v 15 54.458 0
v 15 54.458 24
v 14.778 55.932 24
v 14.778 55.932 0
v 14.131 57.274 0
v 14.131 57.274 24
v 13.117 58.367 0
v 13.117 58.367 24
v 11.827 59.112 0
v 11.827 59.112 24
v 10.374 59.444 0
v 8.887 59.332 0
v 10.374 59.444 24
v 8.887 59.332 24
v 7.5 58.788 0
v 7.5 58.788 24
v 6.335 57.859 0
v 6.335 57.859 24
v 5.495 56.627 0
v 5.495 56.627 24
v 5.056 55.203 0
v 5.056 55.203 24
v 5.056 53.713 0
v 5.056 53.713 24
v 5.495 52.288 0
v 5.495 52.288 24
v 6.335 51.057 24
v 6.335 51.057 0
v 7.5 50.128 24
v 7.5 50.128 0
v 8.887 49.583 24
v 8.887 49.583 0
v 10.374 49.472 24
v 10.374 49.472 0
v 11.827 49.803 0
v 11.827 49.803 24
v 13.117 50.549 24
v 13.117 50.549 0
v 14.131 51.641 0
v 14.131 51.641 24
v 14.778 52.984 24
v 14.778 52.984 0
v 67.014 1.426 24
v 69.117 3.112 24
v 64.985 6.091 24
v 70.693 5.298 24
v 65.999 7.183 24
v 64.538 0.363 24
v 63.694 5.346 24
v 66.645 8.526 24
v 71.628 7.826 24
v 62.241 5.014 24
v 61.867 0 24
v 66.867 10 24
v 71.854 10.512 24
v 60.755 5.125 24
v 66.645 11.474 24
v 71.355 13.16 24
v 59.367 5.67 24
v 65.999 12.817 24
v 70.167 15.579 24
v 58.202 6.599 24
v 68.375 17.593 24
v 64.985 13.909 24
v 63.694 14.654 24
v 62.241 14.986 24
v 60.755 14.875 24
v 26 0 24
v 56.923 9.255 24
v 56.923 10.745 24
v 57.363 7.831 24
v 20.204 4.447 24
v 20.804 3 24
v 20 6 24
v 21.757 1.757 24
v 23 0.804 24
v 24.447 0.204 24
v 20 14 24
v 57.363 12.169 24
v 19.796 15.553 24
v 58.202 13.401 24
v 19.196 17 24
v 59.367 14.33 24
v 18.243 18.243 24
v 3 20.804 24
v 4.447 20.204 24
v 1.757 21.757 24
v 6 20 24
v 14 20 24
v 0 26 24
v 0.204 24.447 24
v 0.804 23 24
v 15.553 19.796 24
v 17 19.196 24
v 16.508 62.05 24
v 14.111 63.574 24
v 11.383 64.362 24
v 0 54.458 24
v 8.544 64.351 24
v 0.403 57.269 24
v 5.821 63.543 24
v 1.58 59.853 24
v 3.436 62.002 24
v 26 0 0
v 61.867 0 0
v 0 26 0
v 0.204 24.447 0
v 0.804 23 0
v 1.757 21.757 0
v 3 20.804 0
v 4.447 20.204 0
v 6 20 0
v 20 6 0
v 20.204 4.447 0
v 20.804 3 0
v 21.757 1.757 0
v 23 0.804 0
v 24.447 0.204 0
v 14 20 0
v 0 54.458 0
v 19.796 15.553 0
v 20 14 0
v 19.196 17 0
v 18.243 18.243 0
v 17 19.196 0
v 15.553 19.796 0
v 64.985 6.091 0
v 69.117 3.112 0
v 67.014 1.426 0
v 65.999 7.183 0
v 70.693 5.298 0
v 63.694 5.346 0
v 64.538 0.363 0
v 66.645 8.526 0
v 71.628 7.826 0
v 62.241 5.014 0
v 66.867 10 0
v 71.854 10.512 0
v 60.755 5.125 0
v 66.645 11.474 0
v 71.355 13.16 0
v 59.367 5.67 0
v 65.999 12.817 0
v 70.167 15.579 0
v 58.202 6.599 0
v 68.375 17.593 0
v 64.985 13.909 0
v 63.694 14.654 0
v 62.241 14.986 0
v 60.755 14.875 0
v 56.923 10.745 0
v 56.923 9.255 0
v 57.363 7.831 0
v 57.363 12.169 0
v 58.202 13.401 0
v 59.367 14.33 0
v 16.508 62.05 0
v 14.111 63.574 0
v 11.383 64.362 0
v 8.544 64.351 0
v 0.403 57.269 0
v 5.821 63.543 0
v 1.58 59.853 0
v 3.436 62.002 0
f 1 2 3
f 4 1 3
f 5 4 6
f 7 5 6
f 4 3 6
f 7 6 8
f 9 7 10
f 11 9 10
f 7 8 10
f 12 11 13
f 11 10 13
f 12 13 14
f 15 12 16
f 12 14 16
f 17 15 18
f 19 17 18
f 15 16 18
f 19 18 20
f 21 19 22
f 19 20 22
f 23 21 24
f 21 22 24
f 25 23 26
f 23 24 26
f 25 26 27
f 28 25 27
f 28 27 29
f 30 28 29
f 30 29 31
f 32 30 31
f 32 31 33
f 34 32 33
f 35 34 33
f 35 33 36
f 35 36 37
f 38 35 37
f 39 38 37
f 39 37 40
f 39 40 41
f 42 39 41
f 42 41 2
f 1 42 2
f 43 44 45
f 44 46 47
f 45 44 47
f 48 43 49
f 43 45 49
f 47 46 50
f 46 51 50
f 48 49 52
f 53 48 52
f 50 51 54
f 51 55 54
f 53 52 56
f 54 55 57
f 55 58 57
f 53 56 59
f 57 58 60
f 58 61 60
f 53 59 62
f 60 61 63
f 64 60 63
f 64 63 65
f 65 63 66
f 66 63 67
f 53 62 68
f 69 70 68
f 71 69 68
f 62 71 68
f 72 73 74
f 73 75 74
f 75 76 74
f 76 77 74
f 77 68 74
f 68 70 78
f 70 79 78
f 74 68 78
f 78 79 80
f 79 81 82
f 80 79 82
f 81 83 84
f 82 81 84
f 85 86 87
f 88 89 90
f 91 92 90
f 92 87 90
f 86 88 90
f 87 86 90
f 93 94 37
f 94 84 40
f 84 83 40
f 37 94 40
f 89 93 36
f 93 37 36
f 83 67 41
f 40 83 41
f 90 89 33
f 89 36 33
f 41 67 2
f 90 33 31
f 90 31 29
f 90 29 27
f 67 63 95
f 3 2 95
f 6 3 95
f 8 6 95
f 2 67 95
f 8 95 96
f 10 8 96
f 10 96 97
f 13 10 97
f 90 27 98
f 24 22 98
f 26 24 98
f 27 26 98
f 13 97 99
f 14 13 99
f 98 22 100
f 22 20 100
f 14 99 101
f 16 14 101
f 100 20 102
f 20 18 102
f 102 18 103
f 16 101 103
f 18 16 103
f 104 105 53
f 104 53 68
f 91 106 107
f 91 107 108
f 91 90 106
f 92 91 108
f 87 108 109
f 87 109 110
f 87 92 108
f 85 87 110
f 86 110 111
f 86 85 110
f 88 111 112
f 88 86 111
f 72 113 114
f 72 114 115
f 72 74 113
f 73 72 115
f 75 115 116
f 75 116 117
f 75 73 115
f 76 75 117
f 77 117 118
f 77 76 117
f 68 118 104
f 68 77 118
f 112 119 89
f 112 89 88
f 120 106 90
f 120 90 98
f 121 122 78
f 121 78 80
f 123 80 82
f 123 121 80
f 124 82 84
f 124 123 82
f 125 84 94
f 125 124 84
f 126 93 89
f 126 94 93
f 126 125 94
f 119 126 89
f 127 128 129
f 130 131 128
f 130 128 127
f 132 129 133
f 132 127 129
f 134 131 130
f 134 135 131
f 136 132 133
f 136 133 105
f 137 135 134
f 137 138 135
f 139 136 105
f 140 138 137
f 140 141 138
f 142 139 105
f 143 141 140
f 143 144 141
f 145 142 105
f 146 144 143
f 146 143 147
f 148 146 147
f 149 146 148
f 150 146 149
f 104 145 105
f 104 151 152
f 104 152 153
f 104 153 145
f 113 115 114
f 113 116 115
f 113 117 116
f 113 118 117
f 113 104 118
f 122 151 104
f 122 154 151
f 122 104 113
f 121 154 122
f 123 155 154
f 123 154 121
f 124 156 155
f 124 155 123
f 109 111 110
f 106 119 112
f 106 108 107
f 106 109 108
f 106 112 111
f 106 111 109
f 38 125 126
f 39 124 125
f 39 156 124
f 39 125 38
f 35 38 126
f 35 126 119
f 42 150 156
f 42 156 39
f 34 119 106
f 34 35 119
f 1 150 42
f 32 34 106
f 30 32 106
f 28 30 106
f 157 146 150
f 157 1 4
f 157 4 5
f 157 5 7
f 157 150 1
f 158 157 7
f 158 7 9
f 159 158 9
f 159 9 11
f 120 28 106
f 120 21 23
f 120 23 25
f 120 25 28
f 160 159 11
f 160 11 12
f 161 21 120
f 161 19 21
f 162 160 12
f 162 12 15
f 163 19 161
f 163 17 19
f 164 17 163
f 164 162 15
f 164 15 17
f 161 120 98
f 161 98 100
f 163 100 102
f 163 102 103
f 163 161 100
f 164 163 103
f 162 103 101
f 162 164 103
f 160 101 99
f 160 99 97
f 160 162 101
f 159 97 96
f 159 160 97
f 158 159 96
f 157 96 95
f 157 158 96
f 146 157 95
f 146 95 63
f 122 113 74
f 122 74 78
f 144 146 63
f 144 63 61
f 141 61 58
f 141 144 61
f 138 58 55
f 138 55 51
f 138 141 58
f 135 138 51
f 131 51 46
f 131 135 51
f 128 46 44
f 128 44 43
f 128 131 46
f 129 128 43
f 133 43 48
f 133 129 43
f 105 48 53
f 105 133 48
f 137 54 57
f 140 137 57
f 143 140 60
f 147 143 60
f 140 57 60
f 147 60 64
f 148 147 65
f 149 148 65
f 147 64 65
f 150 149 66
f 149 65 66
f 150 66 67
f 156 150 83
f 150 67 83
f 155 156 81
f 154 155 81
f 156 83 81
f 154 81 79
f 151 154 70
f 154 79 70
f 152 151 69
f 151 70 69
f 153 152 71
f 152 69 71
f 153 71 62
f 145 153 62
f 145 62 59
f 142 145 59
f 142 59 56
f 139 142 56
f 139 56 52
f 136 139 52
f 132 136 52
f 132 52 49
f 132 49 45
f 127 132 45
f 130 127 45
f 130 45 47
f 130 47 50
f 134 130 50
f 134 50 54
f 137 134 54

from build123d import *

# Parameters (mm, degrees)
BOSS_EXTRUDE1_DEPTH = 24
SKETCH2_R           = 5
CUT_EXTRUDE1_DEPTH  = 100.477304276
CUT_EXTRUDE2_DEPTH  = 100.477304276
FILLET1_R           = 6


with BuildPart() as part:
    # Sketch1 → Boss-Extrude1 (new body)
    with BuildSketch(Plane.XY):
        with BuildLine():
            Line((0, 10), (0, 54.457793632))
            ThreePointArc((0, 54.457793632), (5.821431905, 63.542922617), (16.507913735, 62.050359656))
            Line((16.507913735, 62.050359656), (68.375339639, 17.592566024))
            ThreePointArc((68.375339639, 17.592566024), (71.246276054, 6.530537523), (61.867425905, 0))
            Line((61.867425905, 0), (10, 0))
            ThreePointArc((10, 0), (2.928932188, 2.928932188), (0, 10))
        make_face()
    extrude(amount=BOSS_EXTRUDE1_DEPTH)

    # Sketch2 → Cut-Extrude1 (cut, through all)
    with BuildSketch(Plane.XY.offset(24)):
        with Locations((10, 54.457793632)):
            Circle(SKETCH2_R)
        with Locations((61.867425905, 10)):
            Circle(SKETCH2_R)
    extrude(amount=-CUT_EXTRUDE1_DEPTH, mode=Mode.SUBTRACT)

    # Sketch3 → Cut-Extrude2 (cut, through all)
    with BuildSketch(Plane(origin=(0, 0, 0), x_dir=(-1, 0, 0), z_dir=(0, 0, -1))):
        with BuildLine():
            Line((0, 0), (-20, 0))
            Line((-20, 0), (-20, 14))
            ThreePointArc((-20, 14), (-18.242640687, 18.242640687), (-14, 20))
            Line((-14, 20), (0, 20))
            Line((0, 20), (0, 0))
        make_face()
    extrude(amount=-CUT_EXTRUDE2_DEPTH, mode=Mode.SUBTRACT)

    # Fillet1
    fillet1_edges = [part.edges().sort_by_distance(p)[0] for p in [
        (0, 20, 12),
        (20, 0, 12),
    ]]
    fillet(fillet1_edges, radius=FILLET1_R)


solid = part.part
